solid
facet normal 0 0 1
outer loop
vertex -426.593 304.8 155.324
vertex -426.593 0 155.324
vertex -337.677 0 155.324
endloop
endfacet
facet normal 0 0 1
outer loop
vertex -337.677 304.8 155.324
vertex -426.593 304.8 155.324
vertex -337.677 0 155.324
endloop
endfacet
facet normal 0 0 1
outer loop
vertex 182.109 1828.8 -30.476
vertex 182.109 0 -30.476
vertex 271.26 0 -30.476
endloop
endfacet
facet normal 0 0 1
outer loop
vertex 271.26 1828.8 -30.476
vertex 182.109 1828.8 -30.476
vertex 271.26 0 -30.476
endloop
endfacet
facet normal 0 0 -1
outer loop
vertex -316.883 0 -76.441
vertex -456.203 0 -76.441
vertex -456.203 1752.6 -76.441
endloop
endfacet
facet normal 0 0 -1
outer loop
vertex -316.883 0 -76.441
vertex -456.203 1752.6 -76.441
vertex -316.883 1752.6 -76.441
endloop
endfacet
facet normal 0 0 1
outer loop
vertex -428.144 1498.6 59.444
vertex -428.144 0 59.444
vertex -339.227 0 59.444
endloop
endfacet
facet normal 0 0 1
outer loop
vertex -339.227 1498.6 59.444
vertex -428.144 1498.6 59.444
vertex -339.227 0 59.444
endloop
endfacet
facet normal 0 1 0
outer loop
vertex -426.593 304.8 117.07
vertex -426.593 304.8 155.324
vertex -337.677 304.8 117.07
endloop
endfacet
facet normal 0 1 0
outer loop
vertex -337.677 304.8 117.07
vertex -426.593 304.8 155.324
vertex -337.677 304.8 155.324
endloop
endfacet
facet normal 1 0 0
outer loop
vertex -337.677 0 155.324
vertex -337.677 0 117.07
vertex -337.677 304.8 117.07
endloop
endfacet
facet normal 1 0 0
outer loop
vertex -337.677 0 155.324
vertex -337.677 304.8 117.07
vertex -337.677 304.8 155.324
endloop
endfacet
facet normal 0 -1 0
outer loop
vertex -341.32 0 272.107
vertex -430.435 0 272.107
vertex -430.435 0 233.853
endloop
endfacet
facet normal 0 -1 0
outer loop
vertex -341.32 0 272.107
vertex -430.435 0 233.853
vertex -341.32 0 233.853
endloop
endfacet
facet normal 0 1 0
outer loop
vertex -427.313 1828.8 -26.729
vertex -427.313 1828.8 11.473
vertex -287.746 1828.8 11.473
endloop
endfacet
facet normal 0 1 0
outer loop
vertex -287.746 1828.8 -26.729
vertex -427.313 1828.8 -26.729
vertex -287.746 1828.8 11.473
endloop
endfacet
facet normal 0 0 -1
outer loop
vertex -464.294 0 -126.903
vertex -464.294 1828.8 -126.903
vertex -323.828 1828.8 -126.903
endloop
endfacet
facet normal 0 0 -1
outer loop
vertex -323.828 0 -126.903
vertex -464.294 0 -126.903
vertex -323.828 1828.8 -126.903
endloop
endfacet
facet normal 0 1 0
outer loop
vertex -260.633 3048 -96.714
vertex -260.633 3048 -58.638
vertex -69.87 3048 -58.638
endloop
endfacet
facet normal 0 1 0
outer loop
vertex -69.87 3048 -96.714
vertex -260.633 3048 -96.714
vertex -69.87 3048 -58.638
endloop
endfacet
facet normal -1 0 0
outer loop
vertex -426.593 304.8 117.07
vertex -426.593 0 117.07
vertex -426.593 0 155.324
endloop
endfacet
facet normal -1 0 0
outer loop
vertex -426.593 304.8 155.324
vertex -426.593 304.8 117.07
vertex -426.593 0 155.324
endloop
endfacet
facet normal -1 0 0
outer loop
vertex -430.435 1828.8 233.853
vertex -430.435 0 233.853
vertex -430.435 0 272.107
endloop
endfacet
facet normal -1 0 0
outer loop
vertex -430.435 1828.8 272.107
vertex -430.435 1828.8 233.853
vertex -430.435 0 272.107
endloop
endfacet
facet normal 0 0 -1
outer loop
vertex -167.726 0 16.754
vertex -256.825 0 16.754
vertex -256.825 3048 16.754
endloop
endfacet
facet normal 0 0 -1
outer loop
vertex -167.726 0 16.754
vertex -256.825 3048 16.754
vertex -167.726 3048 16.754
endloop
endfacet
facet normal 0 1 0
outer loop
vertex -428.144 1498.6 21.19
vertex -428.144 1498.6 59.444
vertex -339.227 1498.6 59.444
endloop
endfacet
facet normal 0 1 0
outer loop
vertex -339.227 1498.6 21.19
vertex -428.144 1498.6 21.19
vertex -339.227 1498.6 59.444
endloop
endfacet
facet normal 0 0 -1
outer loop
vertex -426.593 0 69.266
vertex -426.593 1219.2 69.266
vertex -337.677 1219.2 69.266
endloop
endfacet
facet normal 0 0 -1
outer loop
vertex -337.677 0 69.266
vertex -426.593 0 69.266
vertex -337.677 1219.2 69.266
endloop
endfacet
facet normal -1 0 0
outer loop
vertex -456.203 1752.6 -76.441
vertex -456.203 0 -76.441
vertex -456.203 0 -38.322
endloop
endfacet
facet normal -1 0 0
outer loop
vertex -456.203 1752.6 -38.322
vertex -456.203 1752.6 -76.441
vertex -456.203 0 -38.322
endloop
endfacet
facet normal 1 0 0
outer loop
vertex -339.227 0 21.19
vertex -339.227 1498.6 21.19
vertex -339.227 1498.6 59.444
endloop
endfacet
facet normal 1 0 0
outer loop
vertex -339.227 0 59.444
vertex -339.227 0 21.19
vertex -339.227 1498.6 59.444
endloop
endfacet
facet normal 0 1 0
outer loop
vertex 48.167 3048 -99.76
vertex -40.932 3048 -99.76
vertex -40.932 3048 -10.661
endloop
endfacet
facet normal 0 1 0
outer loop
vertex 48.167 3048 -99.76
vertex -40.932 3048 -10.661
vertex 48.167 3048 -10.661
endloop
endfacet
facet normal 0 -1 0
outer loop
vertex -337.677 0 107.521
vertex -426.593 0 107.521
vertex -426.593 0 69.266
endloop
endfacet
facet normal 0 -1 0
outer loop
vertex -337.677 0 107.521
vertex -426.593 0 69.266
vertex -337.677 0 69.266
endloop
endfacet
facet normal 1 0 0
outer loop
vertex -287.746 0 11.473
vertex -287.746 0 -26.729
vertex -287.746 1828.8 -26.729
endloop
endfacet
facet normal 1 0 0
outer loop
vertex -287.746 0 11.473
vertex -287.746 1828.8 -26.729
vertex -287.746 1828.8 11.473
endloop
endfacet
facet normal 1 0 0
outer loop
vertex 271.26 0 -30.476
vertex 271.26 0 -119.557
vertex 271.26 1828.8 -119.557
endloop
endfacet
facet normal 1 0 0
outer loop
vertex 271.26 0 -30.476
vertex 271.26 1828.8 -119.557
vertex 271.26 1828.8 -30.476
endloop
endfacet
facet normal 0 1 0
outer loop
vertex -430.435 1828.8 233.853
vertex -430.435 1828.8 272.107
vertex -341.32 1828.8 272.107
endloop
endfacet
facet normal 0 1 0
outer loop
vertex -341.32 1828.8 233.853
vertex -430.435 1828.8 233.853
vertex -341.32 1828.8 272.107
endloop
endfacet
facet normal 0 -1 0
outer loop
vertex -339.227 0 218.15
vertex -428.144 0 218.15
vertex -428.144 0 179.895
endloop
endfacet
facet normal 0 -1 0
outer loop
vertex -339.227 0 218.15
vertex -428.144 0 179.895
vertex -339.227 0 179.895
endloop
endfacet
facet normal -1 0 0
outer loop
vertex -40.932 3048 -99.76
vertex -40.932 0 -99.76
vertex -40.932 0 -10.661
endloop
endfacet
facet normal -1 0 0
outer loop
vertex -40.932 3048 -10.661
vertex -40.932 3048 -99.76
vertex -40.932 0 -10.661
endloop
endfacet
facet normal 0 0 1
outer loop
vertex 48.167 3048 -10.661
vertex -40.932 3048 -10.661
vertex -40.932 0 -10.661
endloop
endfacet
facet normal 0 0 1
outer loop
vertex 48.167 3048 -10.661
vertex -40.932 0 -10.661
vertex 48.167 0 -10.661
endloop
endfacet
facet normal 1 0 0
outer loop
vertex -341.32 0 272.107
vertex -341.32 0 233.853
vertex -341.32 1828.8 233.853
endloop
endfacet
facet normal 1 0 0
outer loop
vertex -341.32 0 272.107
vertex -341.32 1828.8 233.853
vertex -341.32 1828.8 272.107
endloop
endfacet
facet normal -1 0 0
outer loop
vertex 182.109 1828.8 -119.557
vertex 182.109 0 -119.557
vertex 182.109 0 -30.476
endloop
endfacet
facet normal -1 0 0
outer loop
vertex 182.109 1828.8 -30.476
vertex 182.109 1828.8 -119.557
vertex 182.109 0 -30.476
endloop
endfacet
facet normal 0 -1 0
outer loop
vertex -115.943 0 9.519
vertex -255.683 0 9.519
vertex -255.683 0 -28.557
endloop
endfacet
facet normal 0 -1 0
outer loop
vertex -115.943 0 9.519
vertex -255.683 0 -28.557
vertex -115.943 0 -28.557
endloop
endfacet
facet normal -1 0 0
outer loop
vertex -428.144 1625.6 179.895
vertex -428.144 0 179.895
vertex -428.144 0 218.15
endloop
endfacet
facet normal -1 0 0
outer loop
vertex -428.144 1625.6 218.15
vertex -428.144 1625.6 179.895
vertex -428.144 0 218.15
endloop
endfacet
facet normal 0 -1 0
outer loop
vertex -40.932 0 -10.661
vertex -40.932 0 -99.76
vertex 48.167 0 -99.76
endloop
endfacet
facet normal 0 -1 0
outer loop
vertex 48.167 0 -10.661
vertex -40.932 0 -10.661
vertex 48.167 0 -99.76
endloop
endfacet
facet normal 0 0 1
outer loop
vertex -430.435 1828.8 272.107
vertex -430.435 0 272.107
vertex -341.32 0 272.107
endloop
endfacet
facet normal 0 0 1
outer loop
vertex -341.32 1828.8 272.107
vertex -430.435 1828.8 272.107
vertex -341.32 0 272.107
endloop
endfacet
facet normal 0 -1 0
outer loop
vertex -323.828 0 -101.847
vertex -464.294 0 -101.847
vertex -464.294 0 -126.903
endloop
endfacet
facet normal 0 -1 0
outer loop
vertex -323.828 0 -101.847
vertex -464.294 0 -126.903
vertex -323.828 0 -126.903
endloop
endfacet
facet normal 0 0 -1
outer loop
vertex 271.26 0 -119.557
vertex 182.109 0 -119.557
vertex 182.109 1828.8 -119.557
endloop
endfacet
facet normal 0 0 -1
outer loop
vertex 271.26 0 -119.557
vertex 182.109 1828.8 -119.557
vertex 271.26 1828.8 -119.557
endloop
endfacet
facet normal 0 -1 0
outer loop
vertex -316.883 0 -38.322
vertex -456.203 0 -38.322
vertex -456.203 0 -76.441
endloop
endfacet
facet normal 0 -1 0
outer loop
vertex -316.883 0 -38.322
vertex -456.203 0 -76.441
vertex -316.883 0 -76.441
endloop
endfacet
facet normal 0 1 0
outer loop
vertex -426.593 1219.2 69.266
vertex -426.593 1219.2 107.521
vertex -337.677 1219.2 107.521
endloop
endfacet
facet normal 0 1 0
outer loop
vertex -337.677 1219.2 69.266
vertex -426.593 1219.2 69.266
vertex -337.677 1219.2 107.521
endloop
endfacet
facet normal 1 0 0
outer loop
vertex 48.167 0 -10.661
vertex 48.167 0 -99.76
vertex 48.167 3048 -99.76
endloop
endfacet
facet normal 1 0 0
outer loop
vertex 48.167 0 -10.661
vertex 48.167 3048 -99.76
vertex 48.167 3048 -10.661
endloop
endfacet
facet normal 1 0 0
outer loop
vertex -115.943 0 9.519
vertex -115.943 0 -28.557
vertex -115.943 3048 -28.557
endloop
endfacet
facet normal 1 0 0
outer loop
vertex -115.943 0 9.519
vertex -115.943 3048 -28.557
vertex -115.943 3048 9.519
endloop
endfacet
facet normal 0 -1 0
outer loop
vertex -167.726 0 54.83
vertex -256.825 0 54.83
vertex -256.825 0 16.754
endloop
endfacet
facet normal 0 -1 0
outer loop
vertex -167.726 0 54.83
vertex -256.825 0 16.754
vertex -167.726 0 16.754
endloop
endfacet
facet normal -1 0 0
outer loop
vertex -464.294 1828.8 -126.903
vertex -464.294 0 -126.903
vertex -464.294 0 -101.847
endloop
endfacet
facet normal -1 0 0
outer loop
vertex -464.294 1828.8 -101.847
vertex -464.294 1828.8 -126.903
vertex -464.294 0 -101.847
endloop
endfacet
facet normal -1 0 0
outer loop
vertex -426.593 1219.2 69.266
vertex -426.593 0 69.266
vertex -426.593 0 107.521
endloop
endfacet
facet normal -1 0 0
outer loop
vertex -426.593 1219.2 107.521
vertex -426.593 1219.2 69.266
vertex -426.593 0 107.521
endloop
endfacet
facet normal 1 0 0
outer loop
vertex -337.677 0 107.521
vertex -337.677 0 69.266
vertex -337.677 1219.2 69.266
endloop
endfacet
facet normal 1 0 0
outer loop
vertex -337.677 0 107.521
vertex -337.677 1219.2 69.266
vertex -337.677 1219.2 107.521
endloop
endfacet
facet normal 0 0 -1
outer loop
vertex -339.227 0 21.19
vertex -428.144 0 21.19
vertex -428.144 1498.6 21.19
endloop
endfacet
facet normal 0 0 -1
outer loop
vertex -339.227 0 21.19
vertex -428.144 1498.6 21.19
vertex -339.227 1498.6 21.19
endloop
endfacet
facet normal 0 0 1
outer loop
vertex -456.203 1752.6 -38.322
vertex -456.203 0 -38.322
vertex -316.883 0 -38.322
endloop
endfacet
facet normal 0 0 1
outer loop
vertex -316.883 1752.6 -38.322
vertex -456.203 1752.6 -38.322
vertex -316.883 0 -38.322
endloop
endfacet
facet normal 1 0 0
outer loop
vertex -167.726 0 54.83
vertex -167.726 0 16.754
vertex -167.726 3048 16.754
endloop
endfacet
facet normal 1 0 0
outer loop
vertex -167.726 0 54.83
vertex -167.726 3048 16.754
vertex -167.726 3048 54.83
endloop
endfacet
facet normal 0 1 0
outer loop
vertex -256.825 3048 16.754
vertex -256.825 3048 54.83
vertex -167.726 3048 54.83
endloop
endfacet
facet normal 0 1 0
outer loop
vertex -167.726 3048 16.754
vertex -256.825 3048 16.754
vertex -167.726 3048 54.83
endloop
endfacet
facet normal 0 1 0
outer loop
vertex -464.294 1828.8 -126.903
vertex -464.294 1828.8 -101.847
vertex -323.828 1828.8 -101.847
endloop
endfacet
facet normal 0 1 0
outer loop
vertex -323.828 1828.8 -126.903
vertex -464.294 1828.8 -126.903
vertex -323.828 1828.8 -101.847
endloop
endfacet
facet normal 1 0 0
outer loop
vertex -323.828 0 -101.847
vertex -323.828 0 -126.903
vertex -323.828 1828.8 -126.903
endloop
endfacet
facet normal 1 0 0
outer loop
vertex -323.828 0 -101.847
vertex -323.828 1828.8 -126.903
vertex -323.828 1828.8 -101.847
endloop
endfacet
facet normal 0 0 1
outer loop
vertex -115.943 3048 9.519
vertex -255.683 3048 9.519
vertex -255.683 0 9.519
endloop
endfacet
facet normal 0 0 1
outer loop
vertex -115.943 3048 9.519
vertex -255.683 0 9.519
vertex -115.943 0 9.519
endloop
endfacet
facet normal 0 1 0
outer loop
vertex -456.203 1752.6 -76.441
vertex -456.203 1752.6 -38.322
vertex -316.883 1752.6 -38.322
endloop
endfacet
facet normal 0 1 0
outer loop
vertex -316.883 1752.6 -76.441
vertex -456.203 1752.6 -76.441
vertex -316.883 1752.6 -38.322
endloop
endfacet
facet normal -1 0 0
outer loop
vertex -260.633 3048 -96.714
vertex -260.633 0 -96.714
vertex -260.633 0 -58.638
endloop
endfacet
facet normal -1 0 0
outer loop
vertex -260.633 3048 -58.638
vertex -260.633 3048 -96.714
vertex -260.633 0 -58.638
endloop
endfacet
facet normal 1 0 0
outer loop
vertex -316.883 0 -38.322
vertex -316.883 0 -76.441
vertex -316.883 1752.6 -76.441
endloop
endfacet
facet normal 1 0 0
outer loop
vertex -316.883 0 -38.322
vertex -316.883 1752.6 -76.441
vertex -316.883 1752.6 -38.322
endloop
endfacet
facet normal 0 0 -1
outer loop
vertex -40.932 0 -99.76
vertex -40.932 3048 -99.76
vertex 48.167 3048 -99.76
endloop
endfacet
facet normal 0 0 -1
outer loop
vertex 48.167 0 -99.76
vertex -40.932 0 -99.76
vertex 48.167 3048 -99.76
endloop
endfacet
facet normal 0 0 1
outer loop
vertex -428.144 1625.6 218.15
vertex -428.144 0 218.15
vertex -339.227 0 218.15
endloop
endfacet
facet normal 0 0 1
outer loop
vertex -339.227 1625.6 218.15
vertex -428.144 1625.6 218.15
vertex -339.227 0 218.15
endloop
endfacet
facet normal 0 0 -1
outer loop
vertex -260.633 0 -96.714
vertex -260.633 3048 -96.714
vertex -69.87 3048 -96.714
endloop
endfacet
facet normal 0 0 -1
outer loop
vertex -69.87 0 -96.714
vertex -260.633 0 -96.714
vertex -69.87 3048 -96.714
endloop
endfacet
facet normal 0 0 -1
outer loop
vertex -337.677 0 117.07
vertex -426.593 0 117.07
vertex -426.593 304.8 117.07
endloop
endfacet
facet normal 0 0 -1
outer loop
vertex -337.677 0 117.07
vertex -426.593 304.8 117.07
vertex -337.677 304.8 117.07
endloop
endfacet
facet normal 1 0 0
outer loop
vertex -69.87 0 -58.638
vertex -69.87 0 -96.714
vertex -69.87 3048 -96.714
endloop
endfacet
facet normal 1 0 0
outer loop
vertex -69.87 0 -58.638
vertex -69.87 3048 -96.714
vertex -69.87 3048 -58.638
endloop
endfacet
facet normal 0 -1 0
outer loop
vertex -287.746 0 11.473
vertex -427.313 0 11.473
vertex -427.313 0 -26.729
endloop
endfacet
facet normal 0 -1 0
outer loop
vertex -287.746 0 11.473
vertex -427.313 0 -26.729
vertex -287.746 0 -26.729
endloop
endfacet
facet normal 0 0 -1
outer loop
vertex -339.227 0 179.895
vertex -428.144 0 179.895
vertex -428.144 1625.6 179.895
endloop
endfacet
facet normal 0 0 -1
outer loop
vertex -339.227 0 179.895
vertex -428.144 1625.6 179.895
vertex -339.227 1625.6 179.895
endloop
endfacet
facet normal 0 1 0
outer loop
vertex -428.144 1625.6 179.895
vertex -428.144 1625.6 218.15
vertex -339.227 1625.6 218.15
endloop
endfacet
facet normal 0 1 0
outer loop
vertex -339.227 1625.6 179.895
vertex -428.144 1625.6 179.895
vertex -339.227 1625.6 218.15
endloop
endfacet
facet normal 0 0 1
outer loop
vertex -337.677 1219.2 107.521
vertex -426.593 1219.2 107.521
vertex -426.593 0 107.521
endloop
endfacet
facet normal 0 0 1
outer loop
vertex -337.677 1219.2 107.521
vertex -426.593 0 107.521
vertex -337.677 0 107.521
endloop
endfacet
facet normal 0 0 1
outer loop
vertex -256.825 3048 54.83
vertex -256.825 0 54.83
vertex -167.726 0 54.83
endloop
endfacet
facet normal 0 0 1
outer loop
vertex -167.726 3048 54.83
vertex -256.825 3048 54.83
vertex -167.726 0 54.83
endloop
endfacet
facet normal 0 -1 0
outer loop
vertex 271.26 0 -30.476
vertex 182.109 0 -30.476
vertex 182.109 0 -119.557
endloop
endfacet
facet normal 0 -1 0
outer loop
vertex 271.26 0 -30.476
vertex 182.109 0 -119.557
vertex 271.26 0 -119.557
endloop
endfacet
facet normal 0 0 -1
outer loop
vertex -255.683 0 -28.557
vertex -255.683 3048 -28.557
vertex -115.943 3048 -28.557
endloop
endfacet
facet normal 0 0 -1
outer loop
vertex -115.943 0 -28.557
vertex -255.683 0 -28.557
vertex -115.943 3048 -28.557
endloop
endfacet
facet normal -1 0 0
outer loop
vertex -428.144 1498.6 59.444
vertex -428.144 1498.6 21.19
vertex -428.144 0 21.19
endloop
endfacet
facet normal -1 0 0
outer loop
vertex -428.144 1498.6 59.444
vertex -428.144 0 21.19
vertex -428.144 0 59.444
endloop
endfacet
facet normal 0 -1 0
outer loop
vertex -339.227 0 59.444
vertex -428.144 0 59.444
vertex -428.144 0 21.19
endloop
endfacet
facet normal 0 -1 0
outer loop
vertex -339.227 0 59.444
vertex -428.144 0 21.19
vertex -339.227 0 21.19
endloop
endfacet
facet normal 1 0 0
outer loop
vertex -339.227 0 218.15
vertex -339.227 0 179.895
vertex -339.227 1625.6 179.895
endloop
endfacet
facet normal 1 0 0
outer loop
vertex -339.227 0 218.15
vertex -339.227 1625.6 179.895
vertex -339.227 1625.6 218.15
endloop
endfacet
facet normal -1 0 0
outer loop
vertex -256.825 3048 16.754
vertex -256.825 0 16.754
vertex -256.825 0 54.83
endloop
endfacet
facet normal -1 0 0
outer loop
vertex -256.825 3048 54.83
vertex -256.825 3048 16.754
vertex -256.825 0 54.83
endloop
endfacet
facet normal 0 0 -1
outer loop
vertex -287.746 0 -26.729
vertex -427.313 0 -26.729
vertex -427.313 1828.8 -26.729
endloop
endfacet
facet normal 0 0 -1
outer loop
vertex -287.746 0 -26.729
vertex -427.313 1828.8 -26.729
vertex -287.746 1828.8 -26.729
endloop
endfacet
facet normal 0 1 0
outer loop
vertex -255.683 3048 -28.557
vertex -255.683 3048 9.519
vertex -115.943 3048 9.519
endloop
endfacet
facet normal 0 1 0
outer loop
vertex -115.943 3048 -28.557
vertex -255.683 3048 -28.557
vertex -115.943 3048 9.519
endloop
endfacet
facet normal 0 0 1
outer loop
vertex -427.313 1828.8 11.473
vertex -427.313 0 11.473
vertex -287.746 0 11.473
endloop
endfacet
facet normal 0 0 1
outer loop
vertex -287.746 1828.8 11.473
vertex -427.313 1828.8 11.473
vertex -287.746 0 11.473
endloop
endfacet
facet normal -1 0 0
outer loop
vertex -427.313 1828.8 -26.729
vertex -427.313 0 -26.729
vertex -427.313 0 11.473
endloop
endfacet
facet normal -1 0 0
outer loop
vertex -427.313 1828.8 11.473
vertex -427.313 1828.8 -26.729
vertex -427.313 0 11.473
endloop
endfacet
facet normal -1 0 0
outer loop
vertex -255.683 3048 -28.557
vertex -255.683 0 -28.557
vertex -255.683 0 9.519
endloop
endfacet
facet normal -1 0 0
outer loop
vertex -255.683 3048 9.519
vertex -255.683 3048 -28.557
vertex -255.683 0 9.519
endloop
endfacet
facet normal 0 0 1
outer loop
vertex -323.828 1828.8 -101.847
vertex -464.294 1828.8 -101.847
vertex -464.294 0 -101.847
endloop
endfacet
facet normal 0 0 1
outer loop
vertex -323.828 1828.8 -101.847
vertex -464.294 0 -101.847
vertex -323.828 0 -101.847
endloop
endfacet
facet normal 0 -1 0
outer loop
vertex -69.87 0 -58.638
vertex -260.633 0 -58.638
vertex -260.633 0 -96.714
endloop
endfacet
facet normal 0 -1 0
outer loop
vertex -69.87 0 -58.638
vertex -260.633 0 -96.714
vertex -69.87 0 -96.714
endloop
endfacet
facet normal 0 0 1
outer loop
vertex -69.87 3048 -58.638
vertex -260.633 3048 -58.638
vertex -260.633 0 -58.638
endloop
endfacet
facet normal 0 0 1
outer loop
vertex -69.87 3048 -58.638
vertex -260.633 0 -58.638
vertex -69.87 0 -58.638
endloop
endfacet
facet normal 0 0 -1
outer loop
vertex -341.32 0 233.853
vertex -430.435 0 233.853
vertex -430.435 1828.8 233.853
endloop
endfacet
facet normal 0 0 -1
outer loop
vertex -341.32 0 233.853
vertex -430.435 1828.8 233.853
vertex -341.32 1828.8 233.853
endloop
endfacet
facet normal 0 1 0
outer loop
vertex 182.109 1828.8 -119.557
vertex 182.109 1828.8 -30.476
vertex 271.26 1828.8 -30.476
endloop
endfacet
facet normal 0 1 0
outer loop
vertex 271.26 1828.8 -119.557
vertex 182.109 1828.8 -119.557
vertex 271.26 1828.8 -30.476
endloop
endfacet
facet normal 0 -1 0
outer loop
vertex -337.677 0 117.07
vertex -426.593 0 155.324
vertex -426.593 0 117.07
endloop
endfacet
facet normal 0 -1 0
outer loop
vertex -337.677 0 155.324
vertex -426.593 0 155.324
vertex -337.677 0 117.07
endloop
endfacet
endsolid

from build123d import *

# Parameters (mm, degrees)
F0_W      = 190.7625421882
F0_H      = 38.0763597786
F1_DEPTH  = 3048
F0_W_2    = 89.0986770391
F0_H_2    = 38.0763541907
F0_W_3    = 139.7402212024
F0_H_3    = 38.0763560534
F0_W_4    = 89.0986695886
F0_H_4    = 89.0986705199
F3_W      = 139.5674049854
F3_H      = 38.2013777271
F4_DEPTH  = 1828.8
F5_W      = 139.3197178841
F5_H      = 38.1182990968
F6_DEPTH  = 1752.6
F7_W      = 140.4655277729
F7_H      = 25.0563025475
F8_DEPTH  = 1828.8
F9_W      = 89.1511589289
F9_H      = 89.0802256763
F10_DEPTH = 1828.8
F11_W     = 88.9163315296
F11_H     = 38.2546931505
F12_DEPTH = 304.8
F13_W     = 88.9163315296
F13_H     = 38.2547080517
F14_DEPTH = 1219.2
F15_W     = 88.9163315296
F15_H     = 38.2547006011
F16_DEPTH = 1498.6
F17_W     = 88.9163315296
F17_H     = 38.2546931505
F18_DEPTH = 1625.6
F19_W     = 89.1147255898
F19_H     = 38.2541418076
F20_DEPTH = 1828.8


with BuildPart() as f1:
    # F0 (on Front) → F1 (new body)
    with BuildSketch(Plane.XZ):
        with Locations((-165.2513928711, -77.6757653803)):
            Rectangle(F0_W, F0_H)
    extrude(amount=-F1_DEPTH)


with BuildPart() as f1b:
    # F0 (on Front) → F1, piece 2 (new body)
    with BuildSketch(Plane.XZ):
        with Locations((-212.2756913304, 35.7917780057)):
            Rectangle(F0_W_2, F0_H_2)
    extrude(amount=-F1_DEPTH)


with BuildPart() as f1c:
    # F0 (on Front) → F1, piece 3 (new body)
    with BuildSketch(Plane.XZ):
        with Locations((-185.812626034, -9.5190871507)):
            Rectangle(F0_W_3, F0_H_3)
    extrude(amount=-F1_DEPTH)


with BuildPart() as f1d:
    # F0 (on Front) → F1, piece 4 (new body)
    with BuildSketch(Plane.XZ):
        with Locations((3.6172457039, -55.2107128315)):
            Rectangle(F0_W_4, F0_H_4)
    extrude(amount=-F1_DEPTH)


with BuildPart() as f1e:
    # F0 (on Front) → F1, piece 5 (new body)
    with BuildSketch(Plane.XZ):
        with Locations((-378.5708583891, 173.0128061026)):
            Rectangle(F0_W_3, F0_H_3)
    extrude(amount=-F1_DEPTH)


with BuildPart() as f4:
    # F3 (on face) → F4 (new body)
    with BuildSketch(Plane.XZ):
        with Locations((-357.5297147036, -7.6279263012)):
            Rectangle(F3_W, F3_H)
    extrude(amount=-F4_DEPTH)


with BuildPart() as f6:
    # F5 (on face) → F6 (new body)
    with BuildSketch(Plane.XZ):
        with Locations((-386.5427076817, -57.3813859373)):
            Rectangle(F5_W, F5_H)
    extrude(amount=-F6_DEPTH)


with BuildPart() as f8:
    # F7 (on face) → F8 (new body)
    with BuildSketch(Plane.XZ):
        with Locations((-394.0609246492, -114.3748611212)):
            Rectangle(F7_W, F7_H)
    extrude(amount=-F8_DEPTH)


with BuildPart() as f10:
    # F9 (on face) → F10 (new body)
    with BuildSketch(Plane.XZ):
        with Locations((226.684473455, -75.0164631754)):
            Rectangle(F9_W, F9_H)
    extrude(amount=-F10_DEPTH)


with BuildPart() as f12:
    # F11 (on Front) → F12 (new body)
    with BuildSketch(Plane.XZ):
        with Locations((-382.1346908808, 136.1970677972)):
            Rectangle(F11_W, F11_H)
    extrude(amount=-F12_DEPTH)


with BuildPart() as f14:
    # F13 (on Front) → F14 (new body)
    with BuildSketch(Plane.XZ):
        with Locations((-382.1346908808, 88.3938074112)):
            Rectangle(F13_W, F13_H)
    extrude(amount=-F14_DEPTH)


with BuildPart() as f16:
    # F15 (on Front) → F16 (new body)
    with BuildSketch(Plane.XZ):
        with Locations((-383.6855739355, 40.3169505298)):
            Rectangle(F15_W, F15_H)
    extrude(amount=-F16_DEPTH)


with BuildPart() as f18:
    # F17 (on Front) → F18 (new body)
    with BuildSketch(Plane.XZ):
        with Locations((-383.6855739355, 199.0222707391)):
            Rectangle(F17_W, F17_H)
    extrude(amount=-F18_DEPTH)


with BuildPart() as f20:
    # F19 (on Front) → F20 (new body)
    with BuildSketch(Plane.XZ):
        with Locations((-385.8774900436, 252.9801130295)):
            Rectangle(F19_W, F19_H)
    extrude(amount=-F20_DEPTH)


solid = Compound([f1.part, f1b.part, f1c.part, f1d.part, f4.part, f6.part, f8.part, f10.part, f12.part, f14.part, f16.part, f18.part, f20.part])
